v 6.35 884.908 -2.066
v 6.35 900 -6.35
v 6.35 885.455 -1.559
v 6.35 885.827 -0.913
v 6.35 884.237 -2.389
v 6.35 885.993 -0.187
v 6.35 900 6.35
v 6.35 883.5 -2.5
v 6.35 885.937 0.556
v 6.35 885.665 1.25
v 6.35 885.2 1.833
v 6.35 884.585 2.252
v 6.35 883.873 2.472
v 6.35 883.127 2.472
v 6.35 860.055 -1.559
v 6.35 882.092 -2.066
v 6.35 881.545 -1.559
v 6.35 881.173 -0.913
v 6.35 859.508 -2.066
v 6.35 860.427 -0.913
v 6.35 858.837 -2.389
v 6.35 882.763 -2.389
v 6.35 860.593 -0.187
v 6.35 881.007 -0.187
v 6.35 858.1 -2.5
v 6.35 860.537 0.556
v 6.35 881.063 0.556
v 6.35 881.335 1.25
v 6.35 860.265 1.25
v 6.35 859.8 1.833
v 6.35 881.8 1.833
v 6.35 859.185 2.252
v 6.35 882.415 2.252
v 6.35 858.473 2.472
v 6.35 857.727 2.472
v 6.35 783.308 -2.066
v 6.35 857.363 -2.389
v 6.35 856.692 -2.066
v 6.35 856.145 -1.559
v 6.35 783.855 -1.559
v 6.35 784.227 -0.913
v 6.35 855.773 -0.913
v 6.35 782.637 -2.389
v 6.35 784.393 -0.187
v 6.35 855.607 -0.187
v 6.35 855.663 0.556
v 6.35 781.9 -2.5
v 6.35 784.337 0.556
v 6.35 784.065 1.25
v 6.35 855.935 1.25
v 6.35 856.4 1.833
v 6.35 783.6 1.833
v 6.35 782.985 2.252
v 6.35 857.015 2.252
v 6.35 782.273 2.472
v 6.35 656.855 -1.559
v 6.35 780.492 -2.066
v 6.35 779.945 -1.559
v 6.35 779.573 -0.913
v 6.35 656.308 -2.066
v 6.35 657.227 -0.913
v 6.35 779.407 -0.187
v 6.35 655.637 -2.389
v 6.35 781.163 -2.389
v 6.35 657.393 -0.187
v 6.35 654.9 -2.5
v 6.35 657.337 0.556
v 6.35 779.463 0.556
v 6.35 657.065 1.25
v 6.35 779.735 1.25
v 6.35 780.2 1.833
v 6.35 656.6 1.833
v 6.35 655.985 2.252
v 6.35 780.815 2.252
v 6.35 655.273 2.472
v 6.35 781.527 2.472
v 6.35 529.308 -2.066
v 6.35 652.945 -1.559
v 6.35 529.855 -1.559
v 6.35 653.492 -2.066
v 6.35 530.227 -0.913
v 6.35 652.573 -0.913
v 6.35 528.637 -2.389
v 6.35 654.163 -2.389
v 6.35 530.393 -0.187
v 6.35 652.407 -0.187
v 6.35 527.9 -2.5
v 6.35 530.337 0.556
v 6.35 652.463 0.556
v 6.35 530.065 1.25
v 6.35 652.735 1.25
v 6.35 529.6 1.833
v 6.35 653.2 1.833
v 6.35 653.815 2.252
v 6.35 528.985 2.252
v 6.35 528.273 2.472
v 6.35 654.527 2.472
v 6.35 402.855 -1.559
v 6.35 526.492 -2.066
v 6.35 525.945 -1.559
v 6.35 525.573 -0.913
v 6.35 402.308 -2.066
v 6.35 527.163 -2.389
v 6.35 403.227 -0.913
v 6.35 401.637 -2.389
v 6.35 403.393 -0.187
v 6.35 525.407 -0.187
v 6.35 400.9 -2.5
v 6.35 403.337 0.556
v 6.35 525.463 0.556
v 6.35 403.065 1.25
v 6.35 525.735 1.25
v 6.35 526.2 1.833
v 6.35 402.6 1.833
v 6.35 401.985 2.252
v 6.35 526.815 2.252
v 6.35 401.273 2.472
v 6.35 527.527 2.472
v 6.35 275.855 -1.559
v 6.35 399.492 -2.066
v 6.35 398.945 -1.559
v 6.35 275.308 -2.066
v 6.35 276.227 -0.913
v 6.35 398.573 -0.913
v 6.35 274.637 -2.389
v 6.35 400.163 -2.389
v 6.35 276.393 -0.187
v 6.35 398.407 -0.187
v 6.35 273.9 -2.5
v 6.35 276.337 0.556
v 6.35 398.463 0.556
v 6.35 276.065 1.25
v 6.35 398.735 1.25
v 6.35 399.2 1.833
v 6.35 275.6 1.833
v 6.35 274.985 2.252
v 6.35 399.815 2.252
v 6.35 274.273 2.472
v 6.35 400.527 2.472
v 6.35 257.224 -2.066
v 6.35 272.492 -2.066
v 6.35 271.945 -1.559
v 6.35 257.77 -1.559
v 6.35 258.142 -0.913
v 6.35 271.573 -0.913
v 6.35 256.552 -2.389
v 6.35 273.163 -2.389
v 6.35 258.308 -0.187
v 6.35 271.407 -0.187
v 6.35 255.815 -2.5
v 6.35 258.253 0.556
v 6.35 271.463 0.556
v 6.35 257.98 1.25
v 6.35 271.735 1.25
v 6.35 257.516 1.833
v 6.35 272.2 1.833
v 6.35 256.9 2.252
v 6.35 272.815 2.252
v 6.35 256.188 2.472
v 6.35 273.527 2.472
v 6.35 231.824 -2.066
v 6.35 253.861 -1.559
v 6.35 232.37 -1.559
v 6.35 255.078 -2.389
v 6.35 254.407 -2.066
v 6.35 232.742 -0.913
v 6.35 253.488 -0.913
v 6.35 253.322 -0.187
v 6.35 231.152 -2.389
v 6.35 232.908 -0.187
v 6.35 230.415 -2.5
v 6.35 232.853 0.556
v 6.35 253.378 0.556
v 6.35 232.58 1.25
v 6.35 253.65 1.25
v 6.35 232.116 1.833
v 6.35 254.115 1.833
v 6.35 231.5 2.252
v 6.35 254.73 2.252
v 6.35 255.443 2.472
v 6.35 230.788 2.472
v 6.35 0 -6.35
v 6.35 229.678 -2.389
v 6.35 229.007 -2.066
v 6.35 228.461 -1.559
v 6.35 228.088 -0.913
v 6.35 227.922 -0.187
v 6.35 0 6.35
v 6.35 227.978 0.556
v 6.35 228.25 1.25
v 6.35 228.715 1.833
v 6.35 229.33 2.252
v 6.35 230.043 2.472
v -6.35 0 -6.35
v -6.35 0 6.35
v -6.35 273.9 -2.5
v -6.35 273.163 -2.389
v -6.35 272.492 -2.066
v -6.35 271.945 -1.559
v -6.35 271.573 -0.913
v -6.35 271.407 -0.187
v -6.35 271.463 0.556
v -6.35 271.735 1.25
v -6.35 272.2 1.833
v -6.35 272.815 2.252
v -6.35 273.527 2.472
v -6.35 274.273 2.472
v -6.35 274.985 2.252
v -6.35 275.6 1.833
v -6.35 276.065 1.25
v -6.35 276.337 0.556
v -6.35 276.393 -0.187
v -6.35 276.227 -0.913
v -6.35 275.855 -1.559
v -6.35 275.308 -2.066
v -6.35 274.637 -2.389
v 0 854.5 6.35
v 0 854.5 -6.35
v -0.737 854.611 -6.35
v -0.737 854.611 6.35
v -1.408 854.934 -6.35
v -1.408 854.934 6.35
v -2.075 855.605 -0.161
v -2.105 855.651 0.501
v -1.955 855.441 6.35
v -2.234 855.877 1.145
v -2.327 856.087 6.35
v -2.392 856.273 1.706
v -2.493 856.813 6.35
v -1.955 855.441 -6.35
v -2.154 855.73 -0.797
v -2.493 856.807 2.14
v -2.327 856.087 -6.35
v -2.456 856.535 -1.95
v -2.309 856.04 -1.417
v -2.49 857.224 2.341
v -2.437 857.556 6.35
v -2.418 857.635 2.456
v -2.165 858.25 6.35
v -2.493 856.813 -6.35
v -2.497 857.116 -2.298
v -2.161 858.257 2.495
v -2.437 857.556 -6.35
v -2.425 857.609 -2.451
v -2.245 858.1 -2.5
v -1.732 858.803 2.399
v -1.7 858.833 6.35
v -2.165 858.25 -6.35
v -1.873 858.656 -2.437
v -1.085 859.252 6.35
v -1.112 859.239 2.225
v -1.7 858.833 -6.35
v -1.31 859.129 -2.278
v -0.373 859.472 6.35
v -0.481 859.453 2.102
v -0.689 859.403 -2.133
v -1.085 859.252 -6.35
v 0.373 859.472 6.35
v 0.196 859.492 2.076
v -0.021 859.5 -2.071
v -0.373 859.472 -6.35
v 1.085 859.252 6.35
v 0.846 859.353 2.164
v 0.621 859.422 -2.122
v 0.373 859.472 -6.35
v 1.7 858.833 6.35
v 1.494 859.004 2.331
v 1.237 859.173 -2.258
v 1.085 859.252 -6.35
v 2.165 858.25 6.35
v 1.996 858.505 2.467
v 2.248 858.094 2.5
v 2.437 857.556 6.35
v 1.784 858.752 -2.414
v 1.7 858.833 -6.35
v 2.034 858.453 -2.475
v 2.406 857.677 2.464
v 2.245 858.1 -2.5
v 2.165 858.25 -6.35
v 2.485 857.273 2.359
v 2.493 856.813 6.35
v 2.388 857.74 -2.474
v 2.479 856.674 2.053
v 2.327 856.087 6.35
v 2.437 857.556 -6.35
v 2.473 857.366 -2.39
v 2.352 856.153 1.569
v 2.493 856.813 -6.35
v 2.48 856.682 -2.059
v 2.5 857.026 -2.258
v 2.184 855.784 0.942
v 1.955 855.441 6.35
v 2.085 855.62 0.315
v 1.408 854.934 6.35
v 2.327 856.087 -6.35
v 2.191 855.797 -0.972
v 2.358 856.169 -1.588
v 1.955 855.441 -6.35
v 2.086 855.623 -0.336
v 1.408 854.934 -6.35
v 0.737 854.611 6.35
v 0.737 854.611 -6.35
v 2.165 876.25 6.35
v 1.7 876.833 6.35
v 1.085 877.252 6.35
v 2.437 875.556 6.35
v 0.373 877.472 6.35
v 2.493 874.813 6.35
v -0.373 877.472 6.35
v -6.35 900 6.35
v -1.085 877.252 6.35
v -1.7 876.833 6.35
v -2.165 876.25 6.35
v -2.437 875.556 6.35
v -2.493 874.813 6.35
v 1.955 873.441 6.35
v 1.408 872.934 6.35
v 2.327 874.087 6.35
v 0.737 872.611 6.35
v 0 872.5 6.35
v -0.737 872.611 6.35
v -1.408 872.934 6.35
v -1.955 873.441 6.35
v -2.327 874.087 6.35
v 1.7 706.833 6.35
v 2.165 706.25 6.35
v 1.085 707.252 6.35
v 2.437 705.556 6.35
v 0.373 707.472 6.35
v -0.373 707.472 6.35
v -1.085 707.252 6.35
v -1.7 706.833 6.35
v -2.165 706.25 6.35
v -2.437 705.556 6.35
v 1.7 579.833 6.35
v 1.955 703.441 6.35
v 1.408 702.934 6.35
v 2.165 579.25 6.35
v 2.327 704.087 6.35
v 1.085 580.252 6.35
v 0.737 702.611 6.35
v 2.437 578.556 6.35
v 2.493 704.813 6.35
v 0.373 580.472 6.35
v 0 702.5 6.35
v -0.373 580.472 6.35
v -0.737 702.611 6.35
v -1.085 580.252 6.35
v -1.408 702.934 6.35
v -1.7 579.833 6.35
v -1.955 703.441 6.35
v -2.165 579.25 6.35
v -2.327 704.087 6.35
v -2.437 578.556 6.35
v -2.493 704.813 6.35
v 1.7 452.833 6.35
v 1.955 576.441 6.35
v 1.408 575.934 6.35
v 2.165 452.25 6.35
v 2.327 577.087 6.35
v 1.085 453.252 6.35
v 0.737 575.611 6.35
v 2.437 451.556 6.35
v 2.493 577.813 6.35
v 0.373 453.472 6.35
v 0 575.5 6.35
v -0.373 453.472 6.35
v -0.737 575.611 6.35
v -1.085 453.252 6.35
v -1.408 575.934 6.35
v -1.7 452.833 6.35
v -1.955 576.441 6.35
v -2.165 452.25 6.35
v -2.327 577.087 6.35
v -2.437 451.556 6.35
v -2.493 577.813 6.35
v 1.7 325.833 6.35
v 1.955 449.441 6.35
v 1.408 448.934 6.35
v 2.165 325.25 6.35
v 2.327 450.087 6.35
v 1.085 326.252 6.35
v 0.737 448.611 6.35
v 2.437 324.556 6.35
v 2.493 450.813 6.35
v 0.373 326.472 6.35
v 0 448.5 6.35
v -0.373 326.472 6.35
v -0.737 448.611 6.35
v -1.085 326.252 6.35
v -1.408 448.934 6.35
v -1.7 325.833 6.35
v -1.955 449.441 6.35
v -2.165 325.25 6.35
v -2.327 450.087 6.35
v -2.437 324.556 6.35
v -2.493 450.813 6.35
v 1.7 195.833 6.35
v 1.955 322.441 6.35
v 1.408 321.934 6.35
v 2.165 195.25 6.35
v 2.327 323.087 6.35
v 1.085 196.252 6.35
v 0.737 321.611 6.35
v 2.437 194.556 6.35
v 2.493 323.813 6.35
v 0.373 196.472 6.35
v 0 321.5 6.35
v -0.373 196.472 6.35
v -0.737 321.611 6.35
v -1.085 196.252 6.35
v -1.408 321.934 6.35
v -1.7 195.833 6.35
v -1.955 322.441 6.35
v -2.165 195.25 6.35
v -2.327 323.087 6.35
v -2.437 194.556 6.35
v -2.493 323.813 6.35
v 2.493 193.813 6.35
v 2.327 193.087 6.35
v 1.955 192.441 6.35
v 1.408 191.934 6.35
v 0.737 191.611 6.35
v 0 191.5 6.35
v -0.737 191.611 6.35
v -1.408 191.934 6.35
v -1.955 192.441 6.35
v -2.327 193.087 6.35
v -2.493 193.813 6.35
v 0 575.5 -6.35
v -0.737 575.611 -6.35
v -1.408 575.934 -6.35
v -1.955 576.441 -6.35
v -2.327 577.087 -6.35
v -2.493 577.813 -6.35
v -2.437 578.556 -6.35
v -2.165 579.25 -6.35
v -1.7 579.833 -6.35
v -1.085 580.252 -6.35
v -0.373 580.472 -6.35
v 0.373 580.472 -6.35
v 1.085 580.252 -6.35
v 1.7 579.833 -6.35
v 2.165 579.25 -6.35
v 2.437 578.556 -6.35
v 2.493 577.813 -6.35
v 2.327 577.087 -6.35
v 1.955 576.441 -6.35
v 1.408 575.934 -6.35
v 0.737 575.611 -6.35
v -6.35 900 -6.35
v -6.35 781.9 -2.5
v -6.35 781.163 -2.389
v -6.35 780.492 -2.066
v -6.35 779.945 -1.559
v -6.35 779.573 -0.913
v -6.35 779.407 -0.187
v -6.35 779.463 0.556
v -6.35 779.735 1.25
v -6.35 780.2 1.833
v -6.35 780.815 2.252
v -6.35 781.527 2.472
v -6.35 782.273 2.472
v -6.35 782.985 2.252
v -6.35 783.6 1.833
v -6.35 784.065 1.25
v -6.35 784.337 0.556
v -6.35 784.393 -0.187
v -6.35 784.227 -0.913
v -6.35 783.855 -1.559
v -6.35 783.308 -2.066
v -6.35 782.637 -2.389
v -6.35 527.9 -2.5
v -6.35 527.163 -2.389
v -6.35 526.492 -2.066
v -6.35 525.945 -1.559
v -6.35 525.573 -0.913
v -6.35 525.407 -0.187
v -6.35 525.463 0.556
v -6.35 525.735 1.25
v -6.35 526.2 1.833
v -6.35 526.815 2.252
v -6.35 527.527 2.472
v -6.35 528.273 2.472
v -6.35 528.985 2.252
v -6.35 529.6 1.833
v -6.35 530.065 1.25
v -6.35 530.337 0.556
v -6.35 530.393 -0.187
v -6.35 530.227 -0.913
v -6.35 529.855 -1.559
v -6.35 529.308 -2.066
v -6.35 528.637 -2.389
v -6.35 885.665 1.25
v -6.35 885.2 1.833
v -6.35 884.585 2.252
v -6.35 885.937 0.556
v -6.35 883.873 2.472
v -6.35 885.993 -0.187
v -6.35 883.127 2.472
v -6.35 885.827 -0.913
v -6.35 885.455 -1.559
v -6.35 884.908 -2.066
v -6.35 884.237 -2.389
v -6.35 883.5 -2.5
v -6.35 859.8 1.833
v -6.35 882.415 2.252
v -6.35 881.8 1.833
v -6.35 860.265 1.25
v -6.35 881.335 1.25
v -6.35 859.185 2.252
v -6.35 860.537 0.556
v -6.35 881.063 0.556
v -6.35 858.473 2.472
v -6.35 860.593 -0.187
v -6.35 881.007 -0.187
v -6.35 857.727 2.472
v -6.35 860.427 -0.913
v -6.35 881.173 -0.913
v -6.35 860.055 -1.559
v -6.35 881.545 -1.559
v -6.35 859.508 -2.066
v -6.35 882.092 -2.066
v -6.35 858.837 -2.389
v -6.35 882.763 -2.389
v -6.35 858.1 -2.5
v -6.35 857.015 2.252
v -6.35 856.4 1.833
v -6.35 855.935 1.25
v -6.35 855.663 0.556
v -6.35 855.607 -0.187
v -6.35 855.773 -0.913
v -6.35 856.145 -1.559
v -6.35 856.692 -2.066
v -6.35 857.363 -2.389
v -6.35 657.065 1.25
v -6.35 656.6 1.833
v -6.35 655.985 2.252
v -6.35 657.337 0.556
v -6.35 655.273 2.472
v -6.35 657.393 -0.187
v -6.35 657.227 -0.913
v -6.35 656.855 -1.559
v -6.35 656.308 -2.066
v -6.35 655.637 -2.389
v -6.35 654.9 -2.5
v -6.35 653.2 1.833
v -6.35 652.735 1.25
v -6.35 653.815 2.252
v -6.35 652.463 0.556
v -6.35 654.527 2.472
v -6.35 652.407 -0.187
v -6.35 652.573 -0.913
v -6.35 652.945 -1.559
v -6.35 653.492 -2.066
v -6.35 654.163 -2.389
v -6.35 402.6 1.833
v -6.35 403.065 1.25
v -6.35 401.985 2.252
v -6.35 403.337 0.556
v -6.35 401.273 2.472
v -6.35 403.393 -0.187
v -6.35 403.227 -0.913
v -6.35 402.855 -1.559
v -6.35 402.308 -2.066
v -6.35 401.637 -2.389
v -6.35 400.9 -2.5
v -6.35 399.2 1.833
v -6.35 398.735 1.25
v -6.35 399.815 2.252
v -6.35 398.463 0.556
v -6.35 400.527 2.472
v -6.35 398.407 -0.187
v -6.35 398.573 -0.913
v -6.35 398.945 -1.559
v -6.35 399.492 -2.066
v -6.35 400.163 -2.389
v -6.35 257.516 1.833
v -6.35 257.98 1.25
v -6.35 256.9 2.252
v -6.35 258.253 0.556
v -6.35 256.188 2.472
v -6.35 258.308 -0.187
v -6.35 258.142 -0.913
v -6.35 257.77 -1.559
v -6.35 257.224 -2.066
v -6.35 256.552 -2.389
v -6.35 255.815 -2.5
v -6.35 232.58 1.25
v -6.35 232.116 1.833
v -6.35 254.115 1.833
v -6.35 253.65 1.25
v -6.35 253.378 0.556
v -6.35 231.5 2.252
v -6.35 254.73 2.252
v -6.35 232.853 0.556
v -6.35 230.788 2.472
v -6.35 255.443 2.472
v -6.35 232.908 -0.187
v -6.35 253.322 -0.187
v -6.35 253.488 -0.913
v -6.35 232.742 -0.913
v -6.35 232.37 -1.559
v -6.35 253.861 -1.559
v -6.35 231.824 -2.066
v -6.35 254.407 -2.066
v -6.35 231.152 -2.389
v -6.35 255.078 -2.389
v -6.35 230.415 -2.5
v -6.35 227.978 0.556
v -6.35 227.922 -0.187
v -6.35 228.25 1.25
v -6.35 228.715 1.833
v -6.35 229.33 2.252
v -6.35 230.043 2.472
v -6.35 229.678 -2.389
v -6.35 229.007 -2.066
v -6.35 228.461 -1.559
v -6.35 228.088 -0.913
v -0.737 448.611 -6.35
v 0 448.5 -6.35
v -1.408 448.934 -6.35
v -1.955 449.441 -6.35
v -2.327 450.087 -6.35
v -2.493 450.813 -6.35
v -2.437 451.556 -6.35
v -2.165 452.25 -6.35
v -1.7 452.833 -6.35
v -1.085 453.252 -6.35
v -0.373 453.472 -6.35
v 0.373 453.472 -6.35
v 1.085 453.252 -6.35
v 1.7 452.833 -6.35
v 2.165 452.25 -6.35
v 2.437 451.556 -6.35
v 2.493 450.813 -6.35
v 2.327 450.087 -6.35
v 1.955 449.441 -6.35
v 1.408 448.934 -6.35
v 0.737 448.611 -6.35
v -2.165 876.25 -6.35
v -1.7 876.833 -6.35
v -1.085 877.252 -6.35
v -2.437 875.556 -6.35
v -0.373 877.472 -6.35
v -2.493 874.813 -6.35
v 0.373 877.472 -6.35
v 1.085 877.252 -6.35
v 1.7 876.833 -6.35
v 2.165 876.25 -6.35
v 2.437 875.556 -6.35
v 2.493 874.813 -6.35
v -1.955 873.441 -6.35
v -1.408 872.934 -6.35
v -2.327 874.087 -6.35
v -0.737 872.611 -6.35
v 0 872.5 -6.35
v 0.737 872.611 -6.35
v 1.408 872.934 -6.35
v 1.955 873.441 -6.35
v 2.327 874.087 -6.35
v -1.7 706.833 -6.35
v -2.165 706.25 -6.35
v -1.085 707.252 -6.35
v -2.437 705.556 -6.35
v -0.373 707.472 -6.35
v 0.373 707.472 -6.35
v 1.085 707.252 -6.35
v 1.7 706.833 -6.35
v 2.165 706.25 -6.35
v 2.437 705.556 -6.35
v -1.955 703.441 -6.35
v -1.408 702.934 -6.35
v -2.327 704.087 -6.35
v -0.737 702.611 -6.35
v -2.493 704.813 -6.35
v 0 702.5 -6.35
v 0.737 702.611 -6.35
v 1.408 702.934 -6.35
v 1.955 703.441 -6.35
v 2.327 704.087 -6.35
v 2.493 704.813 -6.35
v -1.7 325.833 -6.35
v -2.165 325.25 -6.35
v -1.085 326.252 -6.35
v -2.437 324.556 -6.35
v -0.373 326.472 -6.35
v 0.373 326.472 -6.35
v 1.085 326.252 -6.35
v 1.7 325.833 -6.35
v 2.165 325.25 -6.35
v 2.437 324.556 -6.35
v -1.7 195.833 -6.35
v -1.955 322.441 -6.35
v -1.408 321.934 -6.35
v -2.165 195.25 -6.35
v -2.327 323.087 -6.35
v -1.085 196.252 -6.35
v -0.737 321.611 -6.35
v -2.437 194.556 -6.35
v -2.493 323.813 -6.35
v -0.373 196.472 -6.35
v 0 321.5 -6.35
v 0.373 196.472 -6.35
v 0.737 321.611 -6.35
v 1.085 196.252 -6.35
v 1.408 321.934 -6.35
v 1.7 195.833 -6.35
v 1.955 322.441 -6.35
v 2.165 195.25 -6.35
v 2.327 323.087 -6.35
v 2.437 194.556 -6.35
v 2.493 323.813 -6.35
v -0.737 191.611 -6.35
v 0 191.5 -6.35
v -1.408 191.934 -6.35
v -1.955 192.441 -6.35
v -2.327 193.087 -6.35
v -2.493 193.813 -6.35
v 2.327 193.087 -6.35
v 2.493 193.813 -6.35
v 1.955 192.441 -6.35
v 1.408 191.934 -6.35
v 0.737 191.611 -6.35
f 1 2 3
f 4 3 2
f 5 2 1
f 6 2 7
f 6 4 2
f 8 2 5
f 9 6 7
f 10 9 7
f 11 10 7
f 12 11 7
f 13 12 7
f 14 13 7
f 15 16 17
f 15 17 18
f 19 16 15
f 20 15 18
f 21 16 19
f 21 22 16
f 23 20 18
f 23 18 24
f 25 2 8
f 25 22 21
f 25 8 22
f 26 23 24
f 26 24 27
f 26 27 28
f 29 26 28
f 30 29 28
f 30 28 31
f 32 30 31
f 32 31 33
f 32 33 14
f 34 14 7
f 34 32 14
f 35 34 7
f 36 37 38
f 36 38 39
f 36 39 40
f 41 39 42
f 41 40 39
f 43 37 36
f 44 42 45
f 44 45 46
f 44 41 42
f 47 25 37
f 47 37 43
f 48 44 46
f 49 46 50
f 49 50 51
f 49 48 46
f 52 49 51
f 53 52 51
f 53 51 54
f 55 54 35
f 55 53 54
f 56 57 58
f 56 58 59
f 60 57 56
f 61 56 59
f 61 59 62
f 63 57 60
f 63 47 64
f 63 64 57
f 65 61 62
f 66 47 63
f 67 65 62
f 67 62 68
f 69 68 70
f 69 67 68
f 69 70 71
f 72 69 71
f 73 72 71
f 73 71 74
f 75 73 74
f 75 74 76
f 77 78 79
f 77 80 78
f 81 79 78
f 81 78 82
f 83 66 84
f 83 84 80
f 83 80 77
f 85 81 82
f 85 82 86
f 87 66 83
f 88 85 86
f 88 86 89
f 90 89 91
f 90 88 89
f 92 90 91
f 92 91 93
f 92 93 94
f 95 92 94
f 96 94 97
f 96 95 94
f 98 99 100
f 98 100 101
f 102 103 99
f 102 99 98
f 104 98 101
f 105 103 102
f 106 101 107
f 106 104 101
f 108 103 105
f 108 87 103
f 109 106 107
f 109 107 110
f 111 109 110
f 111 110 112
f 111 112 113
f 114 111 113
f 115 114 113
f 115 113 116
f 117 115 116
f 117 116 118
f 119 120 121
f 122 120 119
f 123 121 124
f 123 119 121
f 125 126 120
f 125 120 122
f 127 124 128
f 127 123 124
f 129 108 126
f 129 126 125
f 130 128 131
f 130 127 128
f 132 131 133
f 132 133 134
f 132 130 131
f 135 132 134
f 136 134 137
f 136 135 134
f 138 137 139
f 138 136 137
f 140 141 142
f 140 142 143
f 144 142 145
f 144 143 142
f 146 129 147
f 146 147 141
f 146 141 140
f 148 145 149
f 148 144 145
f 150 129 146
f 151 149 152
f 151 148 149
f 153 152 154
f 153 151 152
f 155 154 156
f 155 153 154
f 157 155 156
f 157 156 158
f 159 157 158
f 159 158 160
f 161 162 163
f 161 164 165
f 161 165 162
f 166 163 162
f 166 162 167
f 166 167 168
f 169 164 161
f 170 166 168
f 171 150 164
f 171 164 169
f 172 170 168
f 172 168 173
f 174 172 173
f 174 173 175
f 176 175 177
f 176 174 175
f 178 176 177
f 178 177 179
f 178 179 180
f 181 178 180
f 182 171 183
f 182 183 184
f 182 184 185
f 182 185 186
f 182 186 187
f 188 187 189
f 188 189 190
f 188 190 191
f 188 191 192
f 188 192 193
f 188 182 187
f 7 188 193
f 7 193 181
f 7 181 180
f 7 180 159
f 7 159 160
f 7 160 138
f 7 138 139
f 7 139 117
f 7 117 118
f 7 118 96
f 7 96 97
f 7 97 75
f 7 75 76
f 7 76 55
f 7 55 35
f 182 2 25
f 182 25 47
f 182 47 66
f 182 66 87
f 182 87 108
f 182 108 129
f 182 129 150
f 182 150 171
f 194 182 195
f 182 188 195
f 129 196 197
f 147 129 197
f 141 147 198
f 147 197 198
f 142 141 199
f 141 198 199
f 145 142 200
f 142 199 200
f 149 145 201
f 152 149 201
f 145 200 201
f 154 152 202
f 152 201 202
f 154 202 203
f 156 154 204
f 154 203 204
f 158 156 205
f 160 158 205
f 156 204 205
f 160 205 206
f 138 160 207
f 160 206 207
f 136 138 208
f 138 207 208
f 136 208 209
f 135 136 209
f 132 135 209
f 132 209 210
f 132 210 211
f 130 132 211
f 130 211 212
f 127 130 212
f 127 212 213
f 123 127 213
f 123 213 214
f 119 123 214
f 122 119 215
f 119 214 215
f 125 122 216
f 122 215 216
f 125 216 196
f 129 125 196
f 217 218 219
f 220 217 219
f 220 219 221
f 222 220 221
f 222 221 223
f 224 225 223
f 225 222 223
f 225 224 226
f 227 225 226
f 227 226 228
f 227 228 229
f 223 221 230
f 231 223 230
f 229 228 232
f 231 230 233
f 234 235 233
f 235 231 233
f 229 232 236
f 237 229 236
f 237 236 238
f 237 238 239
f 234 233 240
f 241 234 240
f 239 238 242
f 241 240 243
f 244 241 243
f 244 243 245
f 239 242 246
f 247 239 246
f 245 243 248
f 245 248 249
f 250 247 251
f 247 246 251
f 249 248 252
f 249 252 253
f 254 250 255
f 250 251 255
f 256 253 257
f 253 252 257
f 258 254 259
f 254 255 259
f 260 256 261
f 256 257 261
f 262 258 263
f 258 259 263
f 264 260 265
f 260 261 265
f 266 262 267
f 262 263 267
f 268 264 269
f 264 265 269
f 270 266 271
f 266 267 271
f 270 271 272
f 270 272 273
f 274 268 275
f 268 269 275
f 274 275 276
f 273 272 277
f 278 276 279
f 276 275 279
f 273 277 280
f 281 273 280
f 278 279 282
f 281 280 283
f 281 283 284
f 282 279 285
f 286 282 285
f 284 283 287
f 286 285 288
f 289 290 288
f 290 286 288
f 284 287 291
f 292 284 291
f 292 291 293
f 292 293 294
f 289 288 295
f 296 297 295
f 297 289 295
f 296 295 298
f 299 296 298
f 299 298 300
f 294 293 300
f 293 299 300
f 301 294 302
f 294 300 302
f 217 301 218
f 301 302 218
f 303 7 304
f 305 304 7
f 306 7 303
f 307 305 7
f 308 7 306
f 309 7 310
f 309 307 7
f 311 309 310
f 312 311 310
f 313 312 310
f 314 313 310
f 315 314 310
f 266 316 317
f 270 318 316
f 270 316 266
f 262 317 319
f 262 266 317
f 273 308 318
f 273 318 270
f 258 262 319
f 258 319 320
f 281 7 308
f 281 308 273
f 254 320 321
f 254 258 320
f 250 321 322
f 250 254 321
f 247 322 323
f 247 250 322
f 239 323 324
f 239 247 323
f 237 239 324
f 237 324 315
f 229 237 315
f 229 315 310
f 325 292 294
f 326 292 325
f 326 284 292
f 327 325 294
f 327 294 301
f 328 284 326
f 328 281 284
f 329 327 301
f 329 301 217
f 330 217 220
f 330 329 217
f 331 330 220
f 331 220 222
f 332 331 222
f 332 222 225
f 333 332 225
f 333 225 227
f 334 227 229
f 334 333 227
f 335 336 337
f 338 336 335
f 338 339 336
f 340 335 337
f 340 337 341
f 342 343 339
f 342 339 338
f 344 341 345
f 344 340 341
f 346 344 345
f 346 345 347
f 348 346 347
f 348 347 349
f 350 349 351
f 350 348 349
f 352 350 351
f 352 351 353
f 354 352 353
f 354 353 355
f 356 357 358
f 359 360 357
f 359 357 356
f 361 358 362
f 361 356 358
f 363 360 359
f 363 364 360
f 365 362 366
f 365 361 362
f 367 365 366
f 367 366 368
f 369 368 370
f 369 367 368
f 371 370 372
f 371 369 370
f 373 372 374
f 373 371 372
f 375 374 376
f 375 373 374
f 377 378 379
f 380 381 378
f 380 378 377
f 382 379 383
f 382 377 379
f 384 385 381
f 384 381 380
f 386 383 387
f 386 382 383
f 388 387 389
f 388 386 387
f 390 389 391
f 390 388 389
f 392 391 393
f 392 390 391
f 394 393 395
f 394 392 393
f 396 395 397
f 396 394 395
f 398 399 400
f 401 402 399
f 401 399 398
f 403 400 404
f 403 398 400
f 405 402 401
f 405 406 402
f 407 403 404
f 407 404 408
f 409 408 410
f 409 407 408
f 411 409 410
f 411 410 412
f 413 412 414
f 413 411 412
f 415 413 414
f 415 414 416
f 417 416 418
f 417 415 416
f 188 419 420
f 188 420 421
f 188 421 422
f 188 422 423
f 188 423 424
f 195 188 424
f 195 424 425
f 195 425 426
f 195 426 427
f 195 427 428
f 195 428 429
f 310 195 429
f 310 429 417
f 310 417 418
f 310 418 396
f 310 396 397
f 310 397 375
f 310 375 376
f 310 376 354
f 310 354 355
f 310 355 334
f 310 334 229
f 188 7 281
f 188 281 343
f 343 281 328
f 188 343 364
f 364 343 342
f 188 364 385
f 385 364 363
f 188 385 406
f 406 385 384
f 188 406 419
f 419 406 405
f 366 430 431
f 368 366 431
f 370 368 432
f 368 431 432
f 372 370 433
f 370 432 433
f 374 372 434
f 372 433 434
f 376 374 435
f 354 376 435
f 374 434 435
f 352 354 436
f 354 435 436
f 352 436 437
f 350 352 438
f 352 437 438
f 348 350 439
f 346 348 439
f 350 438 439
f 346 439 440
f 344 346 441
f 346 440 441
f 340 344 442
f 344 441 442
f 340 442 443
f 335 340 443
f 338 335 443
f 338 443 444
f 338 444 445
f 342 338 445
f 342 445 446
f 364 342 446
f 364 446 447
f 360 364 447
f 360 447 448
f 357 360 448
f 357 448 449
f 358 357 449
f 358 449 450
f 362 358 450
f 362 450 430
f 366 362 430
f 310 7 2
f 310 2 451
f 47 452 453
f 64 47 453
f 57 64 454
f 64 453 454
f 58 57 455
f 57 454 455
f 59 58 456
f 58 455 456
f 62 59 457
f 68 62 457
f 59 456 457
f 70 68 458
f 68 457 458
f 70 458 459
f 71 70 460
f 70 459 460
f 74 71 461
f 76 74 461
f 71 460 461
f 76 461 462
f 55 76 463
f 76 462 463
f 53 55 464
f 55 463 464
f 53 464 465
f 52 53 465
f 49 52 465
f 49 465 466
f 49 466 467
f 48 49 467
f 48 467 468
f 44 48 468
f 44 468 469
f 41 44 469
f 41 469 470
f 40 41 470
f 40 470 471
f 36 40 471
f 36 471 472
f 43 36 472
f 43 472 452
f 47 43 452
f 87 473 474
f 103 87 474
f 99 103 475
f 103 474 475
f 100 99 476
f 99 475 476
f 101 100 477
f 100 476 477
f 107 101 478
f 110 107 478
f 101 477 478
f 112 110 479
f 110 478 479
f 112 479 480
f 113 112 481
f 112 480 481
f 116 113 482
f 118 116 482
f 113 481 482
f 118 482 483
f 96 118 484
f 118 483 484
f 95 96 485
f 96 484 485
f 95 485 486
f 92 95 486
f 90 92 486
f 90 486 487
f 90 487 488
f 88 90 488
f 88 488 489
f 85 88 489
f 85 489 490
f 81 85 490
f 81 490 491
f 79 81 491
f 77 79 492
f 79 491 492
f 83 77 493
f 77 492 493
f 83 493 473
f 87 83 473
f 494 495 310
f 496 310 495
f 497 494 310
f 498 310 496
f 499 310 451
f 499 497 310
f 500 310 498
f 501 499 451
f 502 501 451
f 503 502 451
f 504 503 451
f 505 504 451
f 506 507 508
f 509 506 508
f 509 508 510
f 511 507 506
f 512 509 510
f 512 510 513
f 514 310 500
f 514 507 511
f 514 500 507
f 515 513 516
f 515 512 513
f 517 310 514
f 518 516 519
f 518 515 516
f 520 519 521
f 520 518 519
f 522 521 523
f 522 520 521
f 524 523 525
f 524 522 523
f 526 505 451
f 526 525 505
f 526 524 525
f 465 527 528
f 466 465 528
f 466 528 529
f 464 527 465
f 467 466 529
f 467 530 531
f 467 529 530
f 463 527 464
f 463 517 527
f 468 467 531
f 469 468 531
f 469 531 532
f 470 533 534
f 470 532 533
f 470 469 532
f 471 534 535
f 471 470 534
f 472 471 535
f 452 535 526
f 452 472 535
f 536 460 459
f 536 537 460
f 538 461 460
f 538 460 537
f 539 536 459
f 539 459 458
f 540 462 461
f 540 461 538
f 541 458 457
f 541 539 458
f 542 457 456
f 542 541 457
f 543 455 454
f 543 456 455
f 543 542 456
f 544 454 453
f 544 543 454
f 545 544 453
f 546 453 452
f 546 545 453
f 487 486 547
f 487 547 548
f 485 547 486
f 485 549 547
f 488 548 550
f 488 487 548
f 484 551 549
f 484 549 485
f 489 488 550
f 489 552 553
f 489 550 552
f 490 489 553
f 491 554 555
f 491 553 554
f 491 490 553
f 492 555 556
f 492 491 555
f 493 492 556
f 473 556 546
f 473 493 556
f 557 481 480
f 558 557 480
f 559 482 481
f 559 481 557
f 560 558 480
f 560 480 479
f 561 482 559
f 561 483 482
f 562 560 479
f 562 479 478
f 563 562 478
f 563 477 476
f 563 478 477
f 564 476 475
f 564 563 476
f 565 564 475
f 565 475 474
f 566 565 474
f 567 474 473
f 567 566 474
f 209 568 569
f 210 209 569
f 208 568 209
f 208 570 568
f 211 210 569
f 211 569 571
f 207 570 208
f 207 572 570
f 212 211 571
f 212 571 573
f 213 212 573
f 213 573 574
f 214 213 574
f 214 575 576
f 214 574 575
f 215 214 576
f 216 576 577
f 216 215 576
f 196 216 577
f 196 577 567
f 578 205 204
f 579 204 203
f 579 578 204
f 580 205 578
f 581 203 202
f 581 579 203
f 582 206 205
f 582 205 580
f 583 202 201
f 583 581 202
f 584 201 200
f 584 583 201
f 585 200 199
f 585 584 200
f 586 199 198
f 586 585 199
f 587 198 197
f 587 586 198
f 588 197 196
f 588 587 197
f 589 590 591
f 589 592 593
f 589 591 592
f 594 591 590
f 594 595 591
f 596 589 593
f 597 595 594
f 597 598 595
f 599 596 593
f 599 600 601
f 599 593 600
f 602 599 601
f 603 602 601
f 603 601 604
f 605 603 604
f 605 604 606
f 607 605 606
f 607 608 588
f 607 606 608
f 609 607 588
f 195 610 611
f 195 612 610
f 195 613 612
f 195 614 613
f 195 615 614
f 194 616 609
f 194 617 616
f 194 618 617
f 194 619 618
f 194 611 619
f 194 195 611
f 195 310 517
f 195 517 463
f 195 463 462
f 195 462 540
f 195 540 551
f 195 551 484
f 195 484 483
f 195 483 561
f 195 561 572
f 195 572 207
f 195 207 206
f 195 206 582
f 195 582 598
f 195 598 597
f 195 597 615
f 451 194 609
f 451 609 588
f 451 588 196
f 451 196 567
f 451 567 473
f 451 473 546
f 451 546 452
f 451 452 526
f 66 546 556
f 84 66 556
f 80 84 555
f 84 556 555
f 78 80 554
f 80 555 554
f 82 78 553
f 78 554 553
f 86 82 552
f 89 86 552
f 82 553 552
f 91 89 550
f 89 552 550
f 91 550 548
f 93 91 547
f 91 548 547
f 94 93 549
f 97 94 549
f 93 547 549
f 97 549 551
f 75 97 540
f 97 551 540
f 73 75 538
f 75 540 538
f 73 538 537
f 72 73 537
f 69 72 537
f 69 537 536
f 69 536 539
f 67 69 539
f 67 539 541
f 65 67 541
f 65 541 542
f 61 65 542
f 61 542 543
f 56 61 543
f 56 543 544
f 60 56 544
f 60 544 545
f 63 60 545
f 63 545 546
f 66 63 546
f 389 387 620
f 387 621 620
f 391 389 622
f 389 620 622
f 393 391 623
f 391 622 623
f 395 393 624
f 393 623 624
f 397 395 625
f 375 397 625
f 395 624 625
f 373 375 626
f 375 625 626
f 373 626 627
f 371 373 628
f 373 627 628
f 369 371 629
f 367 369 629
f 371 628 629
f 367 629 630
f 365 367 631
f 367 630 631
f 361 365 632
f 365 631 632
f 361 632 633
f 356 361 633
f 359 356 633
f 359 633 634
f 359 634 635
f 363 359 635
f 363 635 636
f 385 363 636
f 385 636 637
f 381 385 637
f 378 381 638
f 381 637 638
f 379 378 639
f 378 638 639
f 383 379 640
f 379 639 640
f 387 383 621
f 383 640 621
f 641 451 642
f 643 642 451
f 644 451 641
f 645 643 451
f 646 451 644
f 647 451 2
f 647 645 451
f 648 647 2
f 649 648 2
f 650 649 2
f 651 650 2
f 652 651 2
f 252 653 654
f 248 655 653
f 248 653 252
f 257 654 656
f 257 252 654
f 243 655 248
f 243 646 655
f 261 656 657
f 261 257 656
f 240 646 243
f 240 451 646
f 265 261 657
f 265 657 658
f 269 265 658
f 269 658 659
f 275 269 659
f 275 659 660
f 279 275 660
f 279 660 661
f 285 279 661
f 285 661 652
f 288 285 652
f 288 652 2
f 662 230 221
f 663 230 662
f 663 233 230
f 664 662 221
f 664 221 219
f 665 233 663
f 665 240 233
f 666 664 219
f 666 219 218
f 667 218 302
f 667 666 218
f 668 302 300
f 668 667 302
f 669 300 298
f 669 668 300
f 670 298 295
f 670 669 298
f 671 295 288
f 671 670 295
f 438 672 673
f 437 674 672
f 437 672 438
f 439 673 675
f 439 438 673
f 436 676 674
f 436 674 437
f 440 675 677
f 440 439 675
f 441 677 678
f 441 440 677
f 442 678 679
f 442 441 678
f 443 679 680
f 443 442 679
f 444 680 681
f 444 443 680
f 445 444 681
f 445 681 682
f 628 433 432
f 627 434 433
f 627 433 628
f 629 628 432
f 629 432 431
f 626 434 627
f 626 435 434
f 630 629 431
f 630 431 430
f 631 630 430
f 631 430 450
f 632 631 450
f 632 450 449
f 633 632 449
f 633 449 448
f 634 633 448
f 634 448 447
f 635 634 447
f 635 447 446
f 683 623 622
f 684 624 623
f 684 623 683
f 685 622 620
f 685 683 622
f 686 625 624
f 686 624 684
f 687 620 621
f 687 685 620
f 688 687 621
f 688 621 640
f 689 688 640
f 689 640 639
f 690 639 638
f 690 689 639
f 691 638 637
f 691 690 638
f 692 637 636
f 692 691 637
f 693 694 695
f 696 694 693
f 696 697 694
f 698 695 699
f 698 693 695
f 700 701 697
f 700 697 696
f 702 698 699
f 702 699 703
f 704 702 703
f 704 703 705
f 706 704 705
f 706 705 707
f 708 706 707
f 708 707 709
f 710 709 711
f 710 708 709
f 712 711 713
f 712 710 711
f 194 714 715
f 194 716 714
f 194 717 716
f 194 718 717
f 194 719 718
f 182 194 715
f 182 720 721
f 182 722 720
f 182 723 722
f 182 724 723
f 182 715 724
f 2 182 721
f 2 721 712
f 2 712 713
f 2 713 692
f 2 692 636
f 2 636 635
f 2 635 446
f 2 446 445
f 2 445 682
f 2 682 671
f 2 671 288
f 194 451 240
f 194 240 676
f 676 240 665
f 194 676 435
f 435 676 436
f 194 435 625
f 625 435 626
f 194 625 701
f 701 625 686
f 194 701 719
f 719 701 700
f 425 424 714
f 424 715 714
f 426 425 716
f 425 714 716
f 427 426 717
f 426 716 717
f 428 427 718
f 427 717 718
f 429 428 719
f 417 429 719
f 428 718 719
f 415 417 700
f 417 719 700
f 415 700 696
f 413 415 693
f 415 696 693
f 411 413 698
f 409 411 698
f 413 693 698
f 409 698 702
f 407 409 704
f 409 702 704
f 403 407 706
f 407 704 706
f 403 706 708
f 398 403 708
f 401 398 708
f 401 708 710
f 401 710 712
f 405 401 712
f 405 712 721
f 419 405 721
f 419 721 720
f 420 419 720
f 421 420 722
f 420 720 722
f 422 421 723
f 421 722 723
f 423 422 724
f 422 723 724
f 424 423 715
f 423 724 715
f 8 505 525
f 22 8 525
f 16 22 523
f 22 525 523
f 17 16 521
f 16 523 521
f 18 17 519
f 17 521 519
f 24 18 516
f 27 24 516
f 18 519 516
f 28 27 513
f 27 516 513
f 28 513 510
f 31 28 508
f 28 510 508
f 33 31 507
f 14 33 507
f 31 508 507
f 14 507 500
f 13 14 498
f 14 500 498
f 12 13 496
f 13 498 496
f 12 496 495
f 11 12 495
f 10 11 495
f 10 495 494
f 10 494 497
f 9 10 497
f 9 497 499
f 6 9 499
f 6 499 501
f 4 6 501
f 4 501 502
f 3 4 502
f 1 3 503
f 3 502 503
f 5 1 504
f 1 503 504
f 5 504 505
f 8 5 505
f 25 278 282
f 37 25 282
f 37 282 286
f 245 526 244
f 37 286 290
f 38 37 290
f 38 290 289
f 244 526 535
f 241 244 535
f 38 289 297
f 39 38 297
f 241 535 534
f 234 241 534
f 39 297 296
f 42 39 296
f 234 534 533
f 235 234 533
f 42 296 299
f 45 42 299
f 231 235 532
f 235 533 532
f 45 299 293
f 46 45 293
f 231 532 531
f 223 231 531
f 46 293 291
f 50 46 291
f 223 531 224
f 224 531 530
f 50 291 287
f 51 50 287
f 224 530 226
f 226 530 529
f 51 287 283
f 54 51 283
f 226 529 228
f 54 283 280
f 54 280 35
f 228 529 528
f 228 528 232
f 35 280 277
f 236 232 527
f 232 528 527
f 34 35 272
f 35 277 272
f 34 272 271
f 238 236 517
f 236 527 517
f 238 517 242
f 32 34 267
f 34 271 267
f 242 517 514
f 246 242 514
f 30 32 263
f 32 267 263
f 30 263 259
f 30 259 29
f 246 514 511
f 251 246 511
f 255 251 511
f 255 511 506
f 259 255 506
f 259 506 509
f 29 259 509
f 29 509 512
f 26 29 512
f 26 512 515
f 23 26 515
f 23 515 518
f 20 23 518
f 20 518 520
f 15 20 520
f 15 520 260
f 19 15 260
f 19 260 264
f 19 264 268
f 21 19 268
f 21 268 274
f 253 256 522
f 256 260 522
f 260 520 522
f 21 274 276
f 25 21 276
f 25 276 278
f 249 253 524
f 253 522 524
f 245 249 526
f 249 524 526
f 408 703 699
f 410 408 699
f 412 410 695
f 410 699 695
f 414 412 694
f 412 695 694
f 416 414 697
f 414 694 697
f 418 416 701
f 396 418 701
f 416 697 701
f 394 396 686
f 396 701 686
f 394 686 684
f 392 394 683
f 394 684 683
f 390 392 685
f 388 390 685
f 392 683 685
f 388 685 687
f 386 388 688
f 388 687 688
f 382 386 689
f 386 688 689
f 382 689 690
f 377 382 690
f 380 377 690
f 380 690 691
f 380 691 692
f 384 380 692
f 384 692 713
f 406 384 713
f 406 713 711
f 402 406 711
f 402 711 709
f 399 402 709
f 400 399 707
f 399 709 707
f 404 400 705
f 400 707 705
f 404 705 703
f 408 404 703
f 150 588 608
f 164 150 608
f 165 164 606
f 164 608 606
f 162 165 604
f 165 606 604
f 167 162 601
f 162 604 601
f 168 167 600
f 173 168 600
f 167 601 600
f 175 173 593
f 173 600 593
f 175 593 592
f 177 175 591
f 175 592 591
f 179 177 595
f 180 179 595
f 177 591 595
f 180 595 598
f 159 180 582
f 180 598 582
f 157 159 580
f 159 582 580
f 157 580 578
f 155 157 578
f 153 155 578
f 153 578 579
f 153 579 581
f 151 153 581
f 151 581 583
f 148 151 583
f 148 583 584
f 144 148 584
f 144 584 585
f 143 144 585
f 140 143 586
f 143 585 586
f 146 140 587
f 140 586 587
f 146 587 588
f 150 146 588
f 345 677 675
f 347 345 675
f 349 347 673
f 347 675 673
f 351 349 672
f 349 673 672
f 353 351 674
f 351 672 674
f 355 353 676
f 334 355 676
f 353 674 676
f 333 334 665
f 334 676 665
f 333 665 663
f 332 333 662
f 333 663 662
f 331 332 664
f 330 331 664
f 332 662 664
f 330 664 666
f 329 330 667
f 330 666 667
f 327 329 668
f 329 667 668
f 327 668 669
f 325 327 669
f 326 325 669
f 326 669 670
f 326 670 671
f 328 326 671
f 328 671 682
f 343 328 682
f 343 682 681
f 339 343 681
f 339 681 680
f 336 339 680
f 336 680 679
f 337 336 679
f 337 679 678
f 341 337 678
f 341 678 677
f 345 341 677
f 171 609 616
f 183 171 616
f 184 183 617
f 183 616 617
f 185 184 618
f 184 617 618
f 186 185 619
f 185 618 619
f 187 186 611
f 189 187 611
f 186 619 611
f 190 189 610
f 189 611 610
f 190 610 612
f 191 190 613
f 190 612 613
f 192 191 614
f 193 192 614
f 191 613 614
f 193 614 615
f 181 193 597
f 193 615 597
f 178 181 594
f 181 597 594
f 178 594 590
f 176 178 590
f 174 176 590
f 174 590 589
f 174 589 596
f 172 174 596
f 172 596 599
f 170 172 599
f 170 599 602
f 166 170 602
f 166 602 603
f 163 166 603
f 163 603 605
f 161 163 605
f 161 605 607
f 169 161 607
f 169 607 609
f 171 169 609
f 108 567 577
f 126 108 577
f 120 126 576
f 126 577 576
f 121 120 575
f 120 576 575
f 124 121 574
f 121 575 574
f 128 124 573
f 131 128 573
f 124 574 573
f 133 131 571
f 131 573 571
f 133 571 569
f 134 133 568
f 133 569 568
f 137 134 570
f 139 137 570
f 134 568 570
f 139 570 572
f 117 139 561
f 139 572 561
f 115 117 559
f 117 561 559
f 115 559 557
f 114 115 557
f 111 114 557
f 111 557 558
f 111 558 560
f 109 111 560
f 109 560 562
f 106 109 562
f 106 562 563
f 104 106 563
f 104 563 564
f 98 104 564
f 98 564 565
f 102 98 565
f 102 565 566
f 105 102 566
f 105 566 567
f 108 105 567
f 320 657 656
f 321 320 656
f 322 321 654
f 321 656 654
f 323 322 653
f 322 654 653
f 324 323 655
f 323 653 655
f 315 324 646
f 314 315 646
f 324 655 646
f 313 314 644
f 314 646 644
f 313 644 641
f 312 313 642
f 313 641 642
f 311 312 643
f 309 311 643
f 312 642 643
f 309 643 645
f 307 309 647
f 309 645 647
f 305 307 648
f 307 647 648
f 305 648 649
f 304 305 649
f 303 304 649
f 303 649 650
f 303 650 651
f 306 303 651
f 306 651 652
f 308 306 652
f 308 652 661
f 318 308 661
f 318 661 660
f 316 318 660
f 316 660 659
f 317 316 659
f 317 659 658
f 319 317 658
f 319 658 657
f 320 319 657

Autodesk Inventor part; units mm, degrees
ref_plane "YZ Plane" through (0, 0, 0) normal (1, 0, 0) x (0, 1, 0)
ref_plane "XZ Plane" through (0, 0, 0) normal (0, 1, 0) x (-1, 0, 0)
ref_plane "XY Plane" through (0, 0, 0) normal (0, 0, 1) x (1, 0, 0)
sketch "Sketch1" plane through (0, 0, 0) normal (0, 1, 0) x (-1, 0, 0)
  line L0 (-6.35, 6.35) -> (6.35, 6.35)
  line L1 (6.35, 6.35) -> (6.35, -6.35)
  line L2 (6.35, -6.35) -> (-6.35, -6.35)
  line L3 (-6.35, -6.35) -> (-6.35, 6.35)
  line L4 (-6.35, 6.35) -> (6.35, -6.35) construction
  line L5 (6.35, 6.35) -> (-6.35, -6.35) construction
  point P0 (0, 0)
  dimension "d0" = 12.7
  dimension "d1" = 12.7
extrude "Extrusion1" add sketch "Sketch1" along normal blind 900
sketch "Sketch25" plane through (6.35, 0, 6.35) normal (0, 0, 1) x (1, 0, 0)
  circle A0 centre (-6.35, 875) radius 2.5
  line L0 (-12.7, 900) -> (0, 900) projected
  line L1 (0, 0) -> (0, 900) projected
  circle A1 centre (-6.35, 857) radius 2.5
  circle A2 centre (-6.35, 705) radius 2.5
  circle A3 centre (-6.35, 578) radius 2.5
  circle A4 centre (-6.35, 451) radius 2.5
  circle A5 centre (-6.35, 324) radius 2.5
  circle A6 centre (-6.35, 194) radius 2.5
  line L2 (0, 0) -> (-12.7, 0) projected
  point P0 (-6.35, 0)
  dimension "d197" = 5
  dimension "d198" = 25
  dimension "d199" = 6.35
  dimension "d200" = 5
  dimension "d201" = 18
  dimension "d202" = 6.35
  dimension "d210" = 5
  dimension "d211" = 152
  dimension "d212" = 6.35
  dimension "d213" = 5
  dimension "d214" = 127
  dimension "d215" = 5
  dimension "d216" = 127
  dimension "d217" = 5
  dimension "d218" = 127
  dimension "d219" = 5
  dimension "d220" = 130
hole "Hole23" at (0, 875, 6.35) at (0, 857, 6.35) at (0, 705, 6.35) at (0, 578, 6.35) at (0, 451, 6.35) at (0, 324, 6.35) at (0, 194, 6.35) direction (0, 0, -1) diameter 5 end through all
sketch "Sketch26" plane through (6.35, 0, -6.35) normal (1, 0, 0) x (0, 0, -1)
  circle A0 centre (-6.35, 883.5) radius 2.5
  line L0 (-12.7, 900) -> (0, 900) projected
  circle A1 centre (-6.35, 858.1) radius 2.5
  circle A2 centre (-6.35, 781.9) radius 2.5
  circle A3 centre (-6.35, 654.9) radius 2.5
  circle A4 centre (-6.35, 527.9) radius 2.5
  circle A5 centre (-6.35, 400.9) radius 2.5
  circle A6 centre (-6.35, 273.9) radius 2.5
  circle A7 centre (-6.35, 255.8152) radius 2.5
  circle A8 centre (-6.35, 230.4152) radius 2.5
  point P0 (-6.35, 0)
  dimension "d231" = 5
  dimension "d232" = 16.5
  dimension "d233" = 5
  dimension "d234" = 25.4
  dimension "d235" = 5
  dimension "d236" = 76.2
  dimension "d237" = 5
  dimension "d238" = 127
  dimension "d239" = 5
  dimension "d240" = 127
  dimension "d241" = 5
  dimension "d242" = 127
  dimension "d243" = 5
  dimension "d244" = 127
  dimension "d245" = 5
  dimension "d246" = 18.0848
  dimension "d247" = 5
  dimension "d248" = 25.4
hole "Hole24" at (6.35, 883.5, 0) at (6.35, 858.1, 0) at (6.35, 781.9, 0) at (6.35, 654.9, 0) at (6.35, 527.9, 0) at (6.35, 400.9, 0) at (6.35, 273.9, 0) at (6.35, 255.8152, 0) at (6.35, 230.4152, 0) direction (-1, 0, 0) diameter 5 end through all
properties part number "Aluminium Rod"
